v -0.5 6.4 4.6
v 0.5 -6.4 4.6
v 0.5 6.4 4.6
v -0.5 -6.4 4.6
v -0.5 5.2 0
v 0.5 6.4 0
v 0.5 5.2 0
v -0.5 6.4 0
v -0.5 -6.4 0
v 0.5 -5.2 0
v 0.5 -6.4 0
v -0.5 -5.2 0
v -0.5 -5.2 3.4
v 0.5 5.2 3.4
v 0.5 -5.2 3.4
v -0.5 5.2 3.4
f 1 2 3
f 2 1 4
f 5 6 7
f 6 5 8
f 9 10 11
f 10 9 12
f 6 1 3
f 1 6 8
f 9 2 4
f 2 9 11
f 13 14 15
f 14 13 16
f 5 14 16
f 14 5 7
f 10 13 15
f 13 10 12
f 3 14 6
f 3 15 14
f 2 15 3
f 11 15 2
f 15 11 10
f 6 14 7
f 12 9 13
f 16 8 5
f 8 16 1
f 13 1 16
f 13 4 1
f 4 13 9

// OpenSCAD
// file: ../lib/at01_inverted_core_snap.scad
// File: at01_inverted_core_snap.scad
// AT-01 — experiment-owned inverted fixed-core / removable-shell snap.
//
// This geometry does not copy the QuackWorks/OpenGrid snap. It keeps only the
// high-level design lessons: compact fixed side, removable compliant side,
// explicit locating/retention roles, and a Lite-like 4.0 / 3.4 mm Z baseline.

// Fixed-side baseline.
AT01_CORE_SIZE = 10.0;
AT01_CORE_HEIGHT = 4.0;
AT01_ROOT_SHOULDER = 0.6;
AT01_ENGAGEMENT_HEIGHT = 3.4;

// Removable shell.
AT01_CLEARANCE = 0.20;              // per side on nominal 10 x 10 core
AT01_SHELL_WALL = 1.20;
AT01_SHELL_TOP = 1.20;
AT01_SHELL_INNER = AT01_CORE_SIZE + 2 * AT01_CLEARANCE;
AT01_SHELL_OUTER = AT01_SHELL_INNER + 2 * AT01_SHELL_WALL;
AT01_SHELL_HEIGHT = AT01_ENGAGEMENT_HEIGHT + AT01_SHELL_TOP;

// Two-sided retention on +/-X.
AT01_RIB_PROTRUSION = 0.35;
AT01_RIB_WIDTH = 4.0;
AT01_RIB_Z_BOTTOM = 0.75;
AT01_RIB_Z_LOWER_MAX = 0.95;
AT01_RIB_Z_UPPER_MAX = 1.15;
AT01_RIB_Z_TOP = 1.60;

// Receiving window in each compliant shell tongue.
// Values are shell-local; assembled shell starts at Z=AT01_ROOT_SHOULDER.
AT01_WINDOW_WIDTH = 4.8;
AT01_WINDOW_Z_MIN = 0.05;
AT01_WINDOW_Z_MAX = 1.10;

// Two relief slots isolate the center tongue on each +/-X wall.
AT01_FLEX_SLOT_Y = 3.0;
AT01_FLEX_SLOT_WIDTH = 0.8;

// Evidence helpers.
AT01_EXPLODED_Z = 8.0;
AT01_PROFILE_SLICE = 1.0;

assert(
    abs(AT01_ROOT_SHOULDER + AT01_ENGAGEMENT_HEIGHT - AT01_CORE_HEIGHT) < 0.0001,
    "AT-01 Lite baseline must satisfy shoulder + engagement = 4.0 mm."
);
assert(
    abs(AT01_SHELL_INNER - (AT01_CORE_SIZE + 2 * AT01_CLEARANCE)) < 0.0001,
    "AT-01 shell inner size must preserve the stated side clearance."
);

module _at01_positive_x_retention_rib() {
    // Polygon is defined in X/Z and extruded along Y.
    rotate([90, 0, 0])
        linear_extrude(height = AT01_RIB_WIDTH, center = true, convexity = 10)
            polygon(points = [
                [AT01_CORE_SIZE / 2, AT01_RIB_Z_BOTTOM],
                [AT01_CORE_SIZE / 2 + AT01_RIB_PROTRUSION, AT01_RIB_Z_LOWER_MAX],
                [AT01_CORE_SIZE / 2 + AT01_RIB_PROTRUSION, AT01_RIB_Z_UPPER_MAX],
                [AT01_CORE_SIZE / 2, AT01_RIB_Z_TOP]
            ]);
}

module at01_fixed_core() {
    union() {
        translate([-AT01_CORE_SIZE / 2, -AT01_CORE_SIZE / 2, 0])
            cube([AT01_CORE_SIZE, AT01_CORE_SIZE, AT01_CORE_HEIGHT]);

        _at01_positive_x_retention_rib();

        mirror([1, 0, 0])
            _at01_positive_x_retention_rib();
    }
}

module _at01_shell_outer() {
    translate([-AT01_SHELL_OUTER / 2, -AT01_SHELL_OUTER / 2, 0])
        cube([AT01_SHELL_OUTER, AT01_SHELL_OUTER, AT01_SHELL_HEIGHT]);
}

module _at01_shell_cavity() {
    // Ends exactly at the underside of the top plate.
    translate([-AT01_SHELL_INNER / 2, -AT01_SHELL_INNER / 2, -0.05])
        cube([AT01_SHELL_INNER, AT01_SHELL_INNER, AT01_ENGAGEMENT_HEIGHT + 0.05]);
}

module _at01_retention_window(x_sign = 1) {
    wall_center = (AT01_SHELL_INNER / 2 + AT01_SHELL_OUTER / 2) / 2;
    translate([
        x_sign * wall_center,
        0,
        (AT01_WINDOW_Z_MIN + AT01_WINDOW_Z_MAX) / 2
    ])
        cube([
            AT01_SHELL_WALL + 0.4,
            AT01_WINDOW_WIDTH,
            AT01_WINDOW_Z_MAX - AT01_WINDOW_Z_MIN
        ], center = true);
}

module _at01_flex_slot(x_sign = 1, y_sign = 1) {
    wall_center = (AT01_SHELL_INNER / 2 + AT01_SHELL_OUTER / 2) / 2;
    translate([
        x_sign * wall_center,
        y_sign * AT01_FLEX_SLOT_Y,
        AT01_ENGAGEMENT_HEIGHT / 2
    ])
        cube([
            AT01_SHELL_WALL + 0.4,
            AT01_FLEX_SLOT_WIDTH,
            AT01_ENGAGEMENT_HEIGHT + 0.10
        ], center = true);
}

module at01_removable_shell() {
    difference() {
        _at01_shell_outer();
        _at01_shell_cavity();

        for (x_sign = [-1, 1]) {
            _at01_retention_window(x_sign);

            for (y_sign = [-1, 1])
                _at01_flex_slot(x_sign, y_sign);
        }
    }
}

module at01_assembled(shell_alpha = 0.55) {
    color([0.68, 0.70, 0.74])
        at01_fixed_core();

    translate([0, 0, AT01_ROOT_SHOULDER])
        color([0.92, 0.30, 0.12, shell_alpha])
            at01_removable_shell();
}

module at01_exploded() {
    color([0.68, 0.70, 0.74])
        at01_fixed_core();

    translate([0, 0, AT01_ROOT_SHOULDER + AT01_EXPLODED_Z])
        color([0.92, 0.30, 0.12])
            at01_removable_shell();
}

module _at01_retention_slice_volume() {
    translate([-20, -AT01_PROFILE_SLICE / 2, -1])
        cube([40, AT01_PROFILE_SLICE, 12]);
}

module _at01_locating_slice_volume() {
    translate([-AT01_PROFILE_SLICE / 2, -20, -1])
        cube([AT01_PROFILE_SLICE, 40, 12]);
}

module at01_fixed_retention_profile() {
    intersection() {
        at01_fixed_core();
        _at01_retention_slice_volume();
    }
}

module at01_shell_retention_profile() {
    intersection() {
        at01_removable_shell();
        translate([0, 0, -AT01_ROOT_SHOULDER])
            _at01_retention_slice_volume();
    }
}

module at01_fixed_locating_profile() {
    intersection() {
        at01_fixed_core();
        _at01_locating_slice_volume();
    }
}

module at01_shell_locating_profile() {
    intersection() {
        at01_removable_shell();
        translate([0, 0, -AT01_ROOT_SHOULDER])
            _at01_locating_slice_volume();
    }
}

module at01_retention_section() {
    color([0.68, 0.70, 0.74])
        at01_fixed_retention_profile();

    translate([0, 0, AT01_ROOT_SHOULDER])
        color([0.92, 0.30, 0.12])
            at01_shell_retention_profile();
}

module at01_locating_section() {
    color([0.68, 0.70, 0.74])
        at01_fixed_locating_profile();

    translate([0, 0, AT01_ROOT_SHOULDER])
        color([0.92, 0.30, 0.12])
            at01_shell_locating_profile();
}
// main file
include <../lib/at01_inverted_core_snap.scad>
at01_shell_locating_profile();
